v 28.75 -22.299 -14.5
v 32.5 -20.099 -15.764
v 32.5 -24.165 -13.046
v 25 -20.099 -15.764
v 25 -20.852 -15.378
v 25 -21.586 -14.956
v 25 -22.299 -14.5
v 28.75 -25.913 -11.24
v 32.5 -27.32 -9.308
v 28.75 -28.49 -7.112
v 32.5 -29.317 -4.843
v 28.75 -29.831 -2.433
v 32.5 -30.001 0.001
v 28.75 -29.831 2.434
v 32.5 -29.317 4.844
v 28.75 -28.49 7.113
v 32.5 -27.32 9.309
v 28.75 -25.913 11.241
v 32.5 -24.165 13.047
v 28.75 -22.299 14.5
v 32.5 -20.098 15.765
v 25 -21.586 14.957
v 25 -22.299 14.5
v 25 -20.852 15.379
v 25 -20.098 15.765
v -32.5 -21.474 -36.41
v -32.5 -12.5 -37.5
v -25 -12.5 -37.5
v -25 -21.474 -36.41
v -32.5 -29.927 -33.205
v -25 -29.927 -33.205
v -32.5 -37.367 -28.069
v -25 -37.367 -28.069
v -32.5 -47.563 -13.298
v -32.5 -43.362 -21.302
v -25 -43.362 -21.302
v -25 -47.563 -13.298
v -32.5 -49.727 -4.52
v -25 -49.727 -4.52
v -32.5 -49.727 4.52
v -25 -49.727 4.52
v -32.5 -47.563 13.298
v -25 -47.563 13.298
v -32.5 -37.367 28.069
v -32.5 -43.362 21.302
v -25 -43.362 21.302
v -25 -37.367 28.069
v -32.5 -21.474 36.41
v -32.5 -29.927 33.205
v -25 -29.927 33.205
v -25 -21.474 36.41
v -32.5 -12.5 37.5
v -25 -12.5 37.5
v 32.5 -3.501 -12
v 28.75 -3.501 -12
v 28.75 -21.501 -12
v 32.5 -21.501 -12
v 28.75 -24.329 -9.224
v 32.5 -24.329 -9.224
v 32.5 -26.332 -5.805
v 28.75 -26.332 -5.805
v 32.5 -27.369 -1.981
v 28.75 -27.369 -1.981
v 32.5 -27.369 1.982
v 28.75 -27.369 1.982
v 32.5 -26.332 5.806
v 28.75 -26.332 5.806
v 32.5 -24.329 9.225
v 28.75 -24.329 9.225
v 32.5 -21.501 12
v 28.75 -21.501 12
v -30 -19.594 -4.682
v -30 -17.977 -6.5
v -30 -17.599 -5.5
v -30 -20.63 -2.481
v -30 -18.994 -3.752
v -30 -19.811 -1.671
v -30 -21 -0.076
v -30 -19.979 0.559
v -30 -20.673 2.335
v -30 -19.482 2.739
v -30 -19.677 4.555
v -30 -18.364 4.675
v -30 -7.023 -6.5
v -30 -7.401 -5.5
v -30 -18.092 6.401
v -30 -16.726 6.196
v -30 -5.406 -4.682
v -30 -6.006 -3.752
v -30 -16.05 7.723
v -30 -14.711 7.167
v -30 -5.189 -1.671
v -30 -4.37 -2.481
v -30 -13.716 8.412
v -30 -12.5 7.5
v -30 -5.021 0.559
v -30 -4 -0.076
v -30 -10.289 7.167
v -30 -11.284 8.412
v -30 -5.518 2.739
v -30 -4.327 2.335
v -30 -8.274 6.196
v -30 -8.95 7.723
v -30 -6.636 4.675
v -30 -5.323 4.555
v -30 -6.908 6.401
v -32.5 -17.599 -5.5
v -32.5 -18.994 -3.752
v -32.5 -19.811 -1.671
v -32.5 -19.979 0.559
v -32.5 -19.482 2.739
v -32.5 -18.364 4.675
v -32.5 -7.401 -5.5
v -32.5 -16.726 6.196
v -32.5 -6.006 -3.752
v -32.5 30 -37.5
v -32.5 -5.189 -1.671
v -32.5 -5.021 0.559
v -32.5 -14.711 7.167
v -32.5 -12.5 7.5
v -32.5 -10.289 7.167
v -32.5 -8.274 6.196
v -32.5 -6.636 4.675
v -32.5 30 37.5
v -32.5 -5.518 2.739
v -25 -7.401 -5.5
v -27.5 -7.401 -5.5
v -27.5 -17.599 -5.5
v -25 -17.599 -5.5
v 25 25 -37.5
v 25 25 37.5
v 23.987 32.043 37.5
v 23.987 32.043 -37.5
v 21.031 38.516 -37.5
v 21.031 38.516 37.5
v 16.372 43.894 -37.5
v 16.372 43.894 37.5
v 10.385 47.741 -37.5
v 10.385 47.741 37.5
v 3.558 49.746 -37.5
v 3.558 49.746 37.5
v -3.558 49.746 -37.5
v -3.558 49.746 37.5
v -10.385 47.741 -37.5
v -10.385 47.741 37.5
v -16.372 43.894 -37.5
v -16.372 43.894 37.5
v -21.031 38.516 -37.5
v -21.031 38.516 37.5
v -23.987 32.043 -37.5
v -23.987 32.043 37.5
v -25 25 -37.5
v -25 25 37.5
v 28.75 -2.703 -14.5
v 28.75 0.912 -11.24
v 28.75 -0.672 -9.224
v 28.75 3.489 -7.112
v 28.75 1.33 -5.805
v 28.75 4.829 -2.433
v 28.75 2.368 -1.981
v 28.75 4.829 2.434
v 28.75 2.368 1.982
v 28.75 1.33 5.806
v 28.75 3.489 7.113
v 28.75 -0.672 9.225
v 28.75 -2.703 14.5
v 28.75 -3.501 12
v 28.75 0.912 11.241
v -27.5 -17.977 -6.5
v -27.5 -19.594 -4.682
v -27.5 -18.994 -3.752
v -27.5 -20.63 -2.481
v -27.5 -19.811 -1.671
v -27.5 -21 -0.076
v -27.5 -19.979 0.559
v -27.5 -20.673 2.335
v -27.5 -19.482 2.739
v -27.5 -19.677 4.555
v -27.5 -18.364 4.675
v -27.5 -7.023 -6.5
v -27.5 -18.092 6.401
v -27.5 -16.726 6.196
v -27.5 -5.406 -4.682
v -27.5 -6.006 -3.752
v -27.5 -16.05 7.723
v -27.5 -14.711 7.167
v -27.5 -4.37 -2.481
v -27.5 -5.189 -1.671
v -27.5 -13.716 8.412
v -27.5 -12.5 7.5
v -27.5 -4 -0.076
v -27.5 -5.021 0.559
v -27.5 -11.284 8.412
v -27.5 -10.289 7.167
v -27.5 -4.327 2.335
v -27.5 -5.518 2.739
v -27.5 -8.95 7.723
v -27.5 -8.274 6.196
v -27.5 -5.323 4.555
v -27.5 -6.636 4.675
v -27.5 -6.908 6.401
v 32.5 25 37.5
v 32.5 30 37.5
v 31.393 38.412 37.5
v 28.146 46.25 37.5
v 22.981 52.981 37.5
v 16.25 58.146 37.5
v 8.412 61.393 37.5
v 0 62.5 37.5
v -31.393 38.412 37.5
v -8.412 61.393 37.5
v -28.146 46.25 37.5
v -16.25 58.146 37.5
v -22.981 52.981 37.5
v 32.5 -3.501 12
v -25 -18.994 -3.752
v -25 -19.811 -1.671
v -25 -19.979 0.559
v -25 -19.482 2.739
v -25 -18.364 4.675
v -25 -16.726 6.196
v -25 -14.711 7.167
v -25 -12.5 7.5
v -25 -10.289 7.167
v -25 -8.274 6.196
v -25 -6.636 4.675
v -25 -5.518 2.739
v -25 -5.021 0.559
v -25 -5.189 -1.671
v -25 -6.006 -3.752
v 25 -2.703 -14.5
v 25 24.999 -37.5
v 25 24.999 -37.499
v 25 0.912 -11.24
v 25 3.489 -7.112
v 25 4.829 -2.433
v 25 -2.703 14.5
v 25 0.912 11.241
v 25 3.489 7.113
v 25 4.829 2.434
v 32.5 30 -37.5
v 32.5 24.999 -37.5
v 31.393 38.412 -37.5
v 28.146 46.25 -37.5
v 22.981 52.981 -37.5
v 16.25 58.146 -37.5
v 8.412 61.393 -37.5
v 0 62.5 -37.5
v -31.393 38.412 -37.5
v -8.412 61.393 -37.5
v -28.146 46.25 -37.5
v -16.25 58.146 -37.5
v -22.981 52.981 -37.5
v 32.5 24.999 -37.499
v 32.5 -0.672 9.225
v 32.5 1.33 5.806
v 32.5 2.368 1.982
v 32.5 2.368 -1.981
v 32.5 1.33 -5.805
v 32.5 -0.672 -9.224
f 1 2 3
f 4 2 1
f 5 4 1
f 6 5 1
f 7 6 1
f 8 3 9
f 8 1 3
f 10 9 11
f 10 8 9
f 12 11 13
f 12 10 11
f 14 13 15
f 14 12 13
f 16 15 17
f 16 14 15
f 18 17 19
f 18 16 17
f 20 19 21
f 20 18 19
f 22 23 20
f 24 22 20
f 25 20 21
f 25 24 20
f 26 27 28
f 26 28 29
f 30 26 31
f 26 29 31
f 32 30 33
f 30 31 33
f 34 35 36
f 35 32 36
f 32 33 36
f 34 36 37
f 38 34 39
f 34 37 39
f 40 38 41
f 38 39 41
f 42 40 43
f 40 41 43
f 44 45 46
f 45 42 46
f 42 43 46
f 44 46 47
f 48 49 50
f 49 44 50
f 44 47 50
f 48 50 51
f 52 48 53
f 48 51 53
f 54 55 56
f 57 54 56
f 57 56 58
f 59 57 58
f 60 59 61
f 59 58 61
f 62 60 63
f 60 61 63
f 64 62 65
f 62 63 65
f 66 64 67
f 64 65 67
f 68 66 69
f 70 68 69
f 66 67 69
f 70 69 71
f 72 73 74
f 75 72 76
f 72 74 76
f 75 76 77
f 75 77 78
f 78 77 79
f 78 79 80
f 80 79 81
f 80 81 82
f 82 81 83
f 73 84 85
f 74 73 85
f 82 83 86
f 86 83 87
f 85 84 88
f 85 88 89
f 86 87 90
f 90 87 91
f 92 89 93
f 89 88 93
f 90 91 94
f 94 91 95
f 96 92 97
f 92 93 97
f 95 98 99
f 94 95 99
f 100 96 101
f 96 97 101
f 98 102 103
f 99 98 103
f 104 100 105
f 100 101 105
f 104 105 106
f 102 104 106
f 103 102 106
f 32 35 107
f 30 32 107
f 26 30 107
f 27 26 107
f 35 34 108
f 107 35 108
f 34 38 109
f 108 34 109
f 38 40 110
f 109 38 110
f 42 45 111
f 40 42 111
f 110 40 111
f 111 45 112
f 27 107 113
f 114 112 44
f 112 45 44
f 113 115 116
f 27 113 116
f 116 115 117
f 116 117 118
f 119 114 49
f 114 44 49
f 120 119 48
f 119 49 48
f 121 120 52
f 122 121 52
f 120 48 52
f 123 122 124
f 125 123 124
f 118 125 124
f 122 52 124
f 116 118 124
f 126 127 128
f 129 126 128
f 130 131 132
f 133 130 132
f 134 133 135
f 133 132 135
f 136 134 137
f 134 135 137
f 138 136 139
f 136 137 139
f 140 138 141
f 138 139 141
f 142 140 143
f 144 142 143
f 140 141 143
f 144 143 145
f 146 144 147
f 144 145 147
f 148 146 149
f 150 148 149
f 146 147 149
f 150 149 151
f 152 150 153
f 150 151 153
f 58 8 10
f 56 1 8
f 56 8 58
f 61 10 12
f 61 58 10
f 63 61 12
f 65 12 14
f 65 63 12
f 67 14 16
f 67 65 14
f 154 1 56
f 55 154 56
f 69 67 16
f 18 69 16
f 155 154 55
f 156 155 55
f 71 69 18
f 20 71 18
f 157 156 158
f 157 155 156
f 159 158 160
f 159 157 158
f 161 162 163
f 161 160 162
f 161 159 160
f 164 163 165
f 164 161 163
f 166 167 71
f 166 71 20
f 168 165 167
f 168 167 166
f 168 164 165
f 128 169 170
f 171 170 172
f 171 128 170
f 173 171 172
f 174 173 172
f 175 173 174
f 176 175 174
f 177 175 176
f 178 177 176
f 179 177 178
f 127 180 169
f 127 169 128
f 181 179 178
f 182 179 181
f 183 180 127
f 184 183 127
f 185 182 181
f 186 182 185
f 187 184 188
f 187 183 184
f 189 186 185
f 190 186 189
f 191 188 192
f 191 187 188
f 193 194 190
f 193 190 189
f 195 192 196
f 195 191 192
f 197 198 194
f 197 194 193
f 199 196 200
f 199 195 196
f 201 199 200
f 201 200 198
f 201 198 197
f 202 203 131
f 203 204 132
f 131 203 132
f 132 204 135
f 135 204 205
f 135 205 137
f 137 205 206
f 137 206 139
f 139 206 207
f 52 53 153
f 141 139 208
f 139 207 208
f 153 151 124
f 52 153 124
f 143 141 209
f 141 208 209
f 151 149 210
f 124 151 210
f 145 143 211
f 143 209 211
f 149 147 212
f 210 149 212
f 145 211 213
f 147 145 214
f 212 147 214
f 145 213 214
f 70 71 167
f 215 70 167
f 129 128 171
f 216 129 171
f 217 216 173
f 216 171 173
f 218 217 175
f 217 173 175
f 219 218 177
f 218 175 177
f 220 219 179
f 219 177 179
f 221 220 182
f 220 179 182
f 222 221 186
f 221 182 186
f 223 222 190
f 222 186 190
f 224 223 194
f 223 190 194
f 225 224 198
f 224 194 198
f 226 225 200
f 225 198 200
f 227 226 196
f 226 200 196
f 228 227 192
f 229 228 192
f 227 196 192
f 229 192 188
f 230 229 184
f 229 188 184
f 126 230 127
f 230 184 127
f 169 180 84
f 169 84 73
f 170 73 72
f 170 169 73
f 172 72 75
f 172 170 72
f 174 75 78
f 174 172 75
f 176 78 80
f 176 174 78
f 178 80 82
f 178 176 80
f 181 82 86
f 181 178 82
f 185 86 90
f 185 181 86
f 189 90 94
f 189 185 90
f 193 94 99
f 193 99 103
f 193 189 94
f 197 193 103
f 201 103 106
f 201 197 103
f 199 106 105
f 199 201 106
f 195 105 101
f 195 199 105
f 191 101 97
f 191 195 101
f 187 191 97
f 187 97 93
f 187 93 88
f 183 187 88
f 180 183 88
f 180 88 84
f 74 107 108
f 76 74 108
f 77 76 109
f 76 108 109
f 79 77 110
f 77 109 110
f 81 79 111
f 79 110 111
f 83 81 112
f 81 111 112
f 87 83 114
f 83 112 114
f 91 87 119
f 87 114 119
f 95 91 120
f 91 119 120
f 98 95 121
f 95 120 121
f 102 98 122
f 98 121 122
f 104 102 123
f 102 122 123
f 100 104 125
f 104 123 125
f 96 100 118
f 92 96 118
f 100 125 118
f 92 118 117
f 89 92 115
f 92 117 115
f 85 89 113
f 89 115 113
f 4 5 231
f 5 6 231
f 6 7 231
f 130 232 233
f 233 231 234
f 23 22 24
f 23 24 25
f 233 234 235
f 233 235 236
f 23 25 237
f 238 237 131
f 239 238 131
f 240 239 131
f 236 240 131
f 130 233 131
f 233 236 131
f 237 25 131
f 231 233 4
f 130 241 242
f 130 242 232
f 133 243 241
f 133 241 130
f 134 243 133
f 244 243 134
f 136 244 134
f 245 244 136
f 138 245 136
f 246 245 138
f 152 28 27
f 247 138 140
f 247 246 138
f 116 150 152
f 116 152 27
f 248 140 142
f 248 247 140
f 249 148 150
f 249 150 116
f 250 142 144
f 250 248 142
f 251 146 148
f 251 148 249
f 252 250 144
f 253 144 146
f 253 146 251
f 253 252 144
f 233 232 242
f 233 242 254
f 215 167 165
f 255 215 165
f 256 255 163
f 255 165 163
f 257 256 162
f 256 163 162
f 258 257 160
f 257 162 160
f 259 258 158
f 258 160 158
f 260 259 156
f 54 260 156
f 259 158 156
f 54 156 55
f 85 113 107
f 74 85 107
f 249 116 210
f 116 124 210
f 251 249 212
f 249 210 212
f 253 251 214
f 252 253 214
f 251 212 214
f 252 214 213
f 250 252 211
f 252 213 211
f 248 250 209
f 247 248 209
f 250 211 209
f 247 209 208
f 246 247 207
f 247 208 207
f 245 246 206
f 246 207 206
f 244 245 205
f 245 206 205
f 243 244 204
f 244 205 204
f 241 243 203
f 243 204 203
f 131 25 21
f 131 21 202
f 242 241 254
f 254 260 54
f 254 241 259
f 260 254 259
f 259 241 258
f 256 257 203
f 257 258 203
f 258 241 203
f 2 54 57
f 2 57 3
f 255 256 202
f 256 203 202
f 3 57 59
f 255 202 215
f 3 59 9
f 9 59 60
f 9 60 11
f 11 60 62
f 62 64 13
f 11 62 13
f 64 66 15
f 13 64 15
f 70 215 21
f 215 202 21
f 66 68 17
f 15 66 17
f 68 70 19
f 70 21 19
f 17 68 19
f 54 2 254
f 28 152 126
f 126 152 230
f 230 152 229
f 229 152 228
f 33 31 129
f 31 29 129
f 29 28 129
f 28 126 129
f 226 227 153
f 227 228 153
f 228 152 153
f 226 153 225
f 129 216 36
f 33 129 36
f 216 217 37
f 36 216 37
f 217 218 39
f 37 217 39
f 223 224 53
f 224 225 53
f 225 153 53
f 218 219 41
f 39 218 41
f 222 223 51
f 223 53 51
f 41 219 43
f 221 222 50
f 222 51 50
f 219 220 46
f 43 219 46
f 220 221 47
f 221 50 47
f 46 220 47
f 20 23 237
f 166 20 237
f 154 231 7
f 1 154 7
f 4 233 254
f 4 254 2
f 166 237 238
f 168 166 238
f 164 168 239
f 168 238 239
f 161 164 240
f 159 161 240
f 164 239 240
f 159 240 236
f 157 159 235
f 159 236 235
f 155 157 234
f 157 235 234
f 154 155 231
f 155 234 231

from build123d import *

# Parameters (mm, degrees)
EXTRUDE_BODY_DEPTH       = 37.5
EXTRCUT_BEVELS_DEPTH     = 93.837223138
EXTRCUT_ROUNDBEVEL_DEPTH = 93.837223138
CUT_EXTRUDE13_DEPTH      = 3.75
CUT_EXTRUDE14_REACH      = 94.837
CUT_EXTRUDE15_REACH      = 99.66
CUT_EXTRUDE16_DEPTH      = 1.25


with BuildPart() as part:
    # Sketch3 → Extrude_Body (new, symmetric)
    with BuildSketch(Plane.XY):
        with BuildLine():
            Line((-25, 25), (-25, -50))
            Line((-25, -50), (-32.5, -50))
            Line((-32.5, -50), (-32.5, 30))
            ThreePointArc((-32.5, 30), (0, 62.5), (32.5, 30))
            Line((32.5, 30), (32.5, -50))
            Line((32.5, -50), (25, -50))
            Line((25, -50), (25, 25))
            ThreePointArc((25, 25), (0, 50), (-25, 25))
        make_face()
    extrude(amount=EXTRUDE_BODY_DEPTH, both=True)

    # Sketch4 → ExtrCut_Bevels (cut, through all)
    with BuildSketch(Plane.ZY.offset(-25)):
        with BuildLine():
            Line((37.5, 25), (42.5, 25))
            Line((42.5, 25), (42.5, -55.000533297))
            Line((42.5, -55.000533297), (-42.499327473, -55.000533297))
            Line((-42.499327473, -55.000533297), (-42.499327473, 24.999466703))
            Line((-42.499327473, 24.999466703), (-37.499327473, 24.999466703))
            Line((-37.499327473, 24.999466703), (-15.764161078, -20.098506949))
            ThreePointArc((-15.764161078, -20.098506949), (0.000531023, -30.000682397), (15.76513551, -20.098367466))
            Line((15.76513551, -20.098367466), (37.5, 25))
        make_face()
    extrude(amount=-EXTRCUT_BEVELS_DEPTH, mode=Mode.SUBTRACT)

    # Sketch8 → ExtrCut_RoundBevel (cut, through all)
    with BuildSketch(Plane(origin=(-25, 0, 0), x_dir=(0, 0, -1), z_dir=(1, 0, 0))):
        with BuildLine():
            Line((-37.5, -12.5), (-42.5, -12.5))
            Line((-42.5, -12.5), (-42.5, -53.627772483))
            Line((-42.5, -53.627772483), (42.5, -53.627772483))
            Line((42.5, -53.627772483), (42.5, -12.5))
            Line((42.5, -12.5), (37.5, -12.5))
            ThreePointArc((37.5, -12.5), (0, -50), (-37.5, -12.5))
        make_face()
    extrude(amount=-EXTRCUT_ROUNDBEVEL_DEPTH, mode=Mode.SUBTRACT)

    # Sketch34 → Cut-Extrude13 (cut, symmetric)
    with BuildSketch(Plane.ZY.offset(-25)):
        with BuildLine():
            Line((-14.499546396, -2.702721459), (-14.499546396, -22.298641924))
            ThreePointArc((-14.499546396, -22.298641924), (0.000453604, -30.000682398), (14.500453604, -22.298641924))
            Line((14.500453604, -22.298641924), (14.500453604, -2.702721459))
            ThreePointArc((14.500453604, -2.702721459), (0.000453604, 4.999319015), (-14.499546396, -2.702721459))
        make_face()
    extrude(amount=CUT_EXTRUDE13_DEPTH, both=True, mode=Mode.SUBTRACT)

    # Sketch35 → Cut-Extrude14 (cut, up to next)
    with BuildSketch(Plane.ZY.offset(-25), mode=Mode.PRIVATE) as cut_extrude14_sk1:
        with BuildLine():
            Line((-11.999546396, -3.500681691), (-11.999546396, -21.500681691))
            ThreePointArc((-11.999546396, -21.500681691), (0.000453604, -27.500681691), (12.000453604, -21.500681691))
            Line((12.000453604, -21.500681691), (12.000453604, -3.500681691))
            ThreePointArc((12.000453604, -3.500681691), (0.000453604, 2.499318309), (-11.999546396, -3.500681691))
        make_face()
    cut_extrude14_tool1 = extrude(cut_extrude14_sk1.sketch, amount=-CUT_EXTRUDE14_REACH, mode=Mode.PRIVATE) & part.part
    add(cut_extrude14_tool1.solids().sort_by_distance((25, -12.500682, 0.000454))[0], mode=Mode.SUBTRACT)

    # Sketch36 → Cut-Extrude15 (cut, up to next)
    with BuildSketch(Plane.ZY.offset(32.5), mode=Mode.PRIVATE) as cut_extrude15_sk1:
        with BuildLine():
            Line((-5.5, -7.400980486), (-5.5, -17.599019514))
            ThreePointArc((-5.5, -17.599019514), (7.5, -12.5), (-5.5, -7.400980486))
        make_face()
    cut_extrude15_tool1 = extrude(cut_extrude15_sk1.sketch, amount=-CUT_EXTRUDE15_REACH, mode=Mode.PRIVATE) & part.part
    add(cut_extrude15_tool1.solids().sort_by_distance((-32.5, -12.5, 0.543202))[0], mode=Mode.SUBTRACT)

    # Sketch37 → Cut-Extrude16 (cut, symmetric)
    with BuildSketch(Plane(origin=(-28.75, 0, 0), x_dir=(0, 0, -1), z_dir=(1, 0, 0))):
        with BuildLine():
            Line((6.5, -7.022774425), (6.5, -17.977225575))
            ThreePointArc((6.5, -17.977225575), (-8.5, -12.5), (6.5, -7.022774425))
        make_face()
    extrude(amount=CUT_EXTRUDE16_DEPTH, both=True, mode=Mode.SUBTRACT)


solid = part.part
